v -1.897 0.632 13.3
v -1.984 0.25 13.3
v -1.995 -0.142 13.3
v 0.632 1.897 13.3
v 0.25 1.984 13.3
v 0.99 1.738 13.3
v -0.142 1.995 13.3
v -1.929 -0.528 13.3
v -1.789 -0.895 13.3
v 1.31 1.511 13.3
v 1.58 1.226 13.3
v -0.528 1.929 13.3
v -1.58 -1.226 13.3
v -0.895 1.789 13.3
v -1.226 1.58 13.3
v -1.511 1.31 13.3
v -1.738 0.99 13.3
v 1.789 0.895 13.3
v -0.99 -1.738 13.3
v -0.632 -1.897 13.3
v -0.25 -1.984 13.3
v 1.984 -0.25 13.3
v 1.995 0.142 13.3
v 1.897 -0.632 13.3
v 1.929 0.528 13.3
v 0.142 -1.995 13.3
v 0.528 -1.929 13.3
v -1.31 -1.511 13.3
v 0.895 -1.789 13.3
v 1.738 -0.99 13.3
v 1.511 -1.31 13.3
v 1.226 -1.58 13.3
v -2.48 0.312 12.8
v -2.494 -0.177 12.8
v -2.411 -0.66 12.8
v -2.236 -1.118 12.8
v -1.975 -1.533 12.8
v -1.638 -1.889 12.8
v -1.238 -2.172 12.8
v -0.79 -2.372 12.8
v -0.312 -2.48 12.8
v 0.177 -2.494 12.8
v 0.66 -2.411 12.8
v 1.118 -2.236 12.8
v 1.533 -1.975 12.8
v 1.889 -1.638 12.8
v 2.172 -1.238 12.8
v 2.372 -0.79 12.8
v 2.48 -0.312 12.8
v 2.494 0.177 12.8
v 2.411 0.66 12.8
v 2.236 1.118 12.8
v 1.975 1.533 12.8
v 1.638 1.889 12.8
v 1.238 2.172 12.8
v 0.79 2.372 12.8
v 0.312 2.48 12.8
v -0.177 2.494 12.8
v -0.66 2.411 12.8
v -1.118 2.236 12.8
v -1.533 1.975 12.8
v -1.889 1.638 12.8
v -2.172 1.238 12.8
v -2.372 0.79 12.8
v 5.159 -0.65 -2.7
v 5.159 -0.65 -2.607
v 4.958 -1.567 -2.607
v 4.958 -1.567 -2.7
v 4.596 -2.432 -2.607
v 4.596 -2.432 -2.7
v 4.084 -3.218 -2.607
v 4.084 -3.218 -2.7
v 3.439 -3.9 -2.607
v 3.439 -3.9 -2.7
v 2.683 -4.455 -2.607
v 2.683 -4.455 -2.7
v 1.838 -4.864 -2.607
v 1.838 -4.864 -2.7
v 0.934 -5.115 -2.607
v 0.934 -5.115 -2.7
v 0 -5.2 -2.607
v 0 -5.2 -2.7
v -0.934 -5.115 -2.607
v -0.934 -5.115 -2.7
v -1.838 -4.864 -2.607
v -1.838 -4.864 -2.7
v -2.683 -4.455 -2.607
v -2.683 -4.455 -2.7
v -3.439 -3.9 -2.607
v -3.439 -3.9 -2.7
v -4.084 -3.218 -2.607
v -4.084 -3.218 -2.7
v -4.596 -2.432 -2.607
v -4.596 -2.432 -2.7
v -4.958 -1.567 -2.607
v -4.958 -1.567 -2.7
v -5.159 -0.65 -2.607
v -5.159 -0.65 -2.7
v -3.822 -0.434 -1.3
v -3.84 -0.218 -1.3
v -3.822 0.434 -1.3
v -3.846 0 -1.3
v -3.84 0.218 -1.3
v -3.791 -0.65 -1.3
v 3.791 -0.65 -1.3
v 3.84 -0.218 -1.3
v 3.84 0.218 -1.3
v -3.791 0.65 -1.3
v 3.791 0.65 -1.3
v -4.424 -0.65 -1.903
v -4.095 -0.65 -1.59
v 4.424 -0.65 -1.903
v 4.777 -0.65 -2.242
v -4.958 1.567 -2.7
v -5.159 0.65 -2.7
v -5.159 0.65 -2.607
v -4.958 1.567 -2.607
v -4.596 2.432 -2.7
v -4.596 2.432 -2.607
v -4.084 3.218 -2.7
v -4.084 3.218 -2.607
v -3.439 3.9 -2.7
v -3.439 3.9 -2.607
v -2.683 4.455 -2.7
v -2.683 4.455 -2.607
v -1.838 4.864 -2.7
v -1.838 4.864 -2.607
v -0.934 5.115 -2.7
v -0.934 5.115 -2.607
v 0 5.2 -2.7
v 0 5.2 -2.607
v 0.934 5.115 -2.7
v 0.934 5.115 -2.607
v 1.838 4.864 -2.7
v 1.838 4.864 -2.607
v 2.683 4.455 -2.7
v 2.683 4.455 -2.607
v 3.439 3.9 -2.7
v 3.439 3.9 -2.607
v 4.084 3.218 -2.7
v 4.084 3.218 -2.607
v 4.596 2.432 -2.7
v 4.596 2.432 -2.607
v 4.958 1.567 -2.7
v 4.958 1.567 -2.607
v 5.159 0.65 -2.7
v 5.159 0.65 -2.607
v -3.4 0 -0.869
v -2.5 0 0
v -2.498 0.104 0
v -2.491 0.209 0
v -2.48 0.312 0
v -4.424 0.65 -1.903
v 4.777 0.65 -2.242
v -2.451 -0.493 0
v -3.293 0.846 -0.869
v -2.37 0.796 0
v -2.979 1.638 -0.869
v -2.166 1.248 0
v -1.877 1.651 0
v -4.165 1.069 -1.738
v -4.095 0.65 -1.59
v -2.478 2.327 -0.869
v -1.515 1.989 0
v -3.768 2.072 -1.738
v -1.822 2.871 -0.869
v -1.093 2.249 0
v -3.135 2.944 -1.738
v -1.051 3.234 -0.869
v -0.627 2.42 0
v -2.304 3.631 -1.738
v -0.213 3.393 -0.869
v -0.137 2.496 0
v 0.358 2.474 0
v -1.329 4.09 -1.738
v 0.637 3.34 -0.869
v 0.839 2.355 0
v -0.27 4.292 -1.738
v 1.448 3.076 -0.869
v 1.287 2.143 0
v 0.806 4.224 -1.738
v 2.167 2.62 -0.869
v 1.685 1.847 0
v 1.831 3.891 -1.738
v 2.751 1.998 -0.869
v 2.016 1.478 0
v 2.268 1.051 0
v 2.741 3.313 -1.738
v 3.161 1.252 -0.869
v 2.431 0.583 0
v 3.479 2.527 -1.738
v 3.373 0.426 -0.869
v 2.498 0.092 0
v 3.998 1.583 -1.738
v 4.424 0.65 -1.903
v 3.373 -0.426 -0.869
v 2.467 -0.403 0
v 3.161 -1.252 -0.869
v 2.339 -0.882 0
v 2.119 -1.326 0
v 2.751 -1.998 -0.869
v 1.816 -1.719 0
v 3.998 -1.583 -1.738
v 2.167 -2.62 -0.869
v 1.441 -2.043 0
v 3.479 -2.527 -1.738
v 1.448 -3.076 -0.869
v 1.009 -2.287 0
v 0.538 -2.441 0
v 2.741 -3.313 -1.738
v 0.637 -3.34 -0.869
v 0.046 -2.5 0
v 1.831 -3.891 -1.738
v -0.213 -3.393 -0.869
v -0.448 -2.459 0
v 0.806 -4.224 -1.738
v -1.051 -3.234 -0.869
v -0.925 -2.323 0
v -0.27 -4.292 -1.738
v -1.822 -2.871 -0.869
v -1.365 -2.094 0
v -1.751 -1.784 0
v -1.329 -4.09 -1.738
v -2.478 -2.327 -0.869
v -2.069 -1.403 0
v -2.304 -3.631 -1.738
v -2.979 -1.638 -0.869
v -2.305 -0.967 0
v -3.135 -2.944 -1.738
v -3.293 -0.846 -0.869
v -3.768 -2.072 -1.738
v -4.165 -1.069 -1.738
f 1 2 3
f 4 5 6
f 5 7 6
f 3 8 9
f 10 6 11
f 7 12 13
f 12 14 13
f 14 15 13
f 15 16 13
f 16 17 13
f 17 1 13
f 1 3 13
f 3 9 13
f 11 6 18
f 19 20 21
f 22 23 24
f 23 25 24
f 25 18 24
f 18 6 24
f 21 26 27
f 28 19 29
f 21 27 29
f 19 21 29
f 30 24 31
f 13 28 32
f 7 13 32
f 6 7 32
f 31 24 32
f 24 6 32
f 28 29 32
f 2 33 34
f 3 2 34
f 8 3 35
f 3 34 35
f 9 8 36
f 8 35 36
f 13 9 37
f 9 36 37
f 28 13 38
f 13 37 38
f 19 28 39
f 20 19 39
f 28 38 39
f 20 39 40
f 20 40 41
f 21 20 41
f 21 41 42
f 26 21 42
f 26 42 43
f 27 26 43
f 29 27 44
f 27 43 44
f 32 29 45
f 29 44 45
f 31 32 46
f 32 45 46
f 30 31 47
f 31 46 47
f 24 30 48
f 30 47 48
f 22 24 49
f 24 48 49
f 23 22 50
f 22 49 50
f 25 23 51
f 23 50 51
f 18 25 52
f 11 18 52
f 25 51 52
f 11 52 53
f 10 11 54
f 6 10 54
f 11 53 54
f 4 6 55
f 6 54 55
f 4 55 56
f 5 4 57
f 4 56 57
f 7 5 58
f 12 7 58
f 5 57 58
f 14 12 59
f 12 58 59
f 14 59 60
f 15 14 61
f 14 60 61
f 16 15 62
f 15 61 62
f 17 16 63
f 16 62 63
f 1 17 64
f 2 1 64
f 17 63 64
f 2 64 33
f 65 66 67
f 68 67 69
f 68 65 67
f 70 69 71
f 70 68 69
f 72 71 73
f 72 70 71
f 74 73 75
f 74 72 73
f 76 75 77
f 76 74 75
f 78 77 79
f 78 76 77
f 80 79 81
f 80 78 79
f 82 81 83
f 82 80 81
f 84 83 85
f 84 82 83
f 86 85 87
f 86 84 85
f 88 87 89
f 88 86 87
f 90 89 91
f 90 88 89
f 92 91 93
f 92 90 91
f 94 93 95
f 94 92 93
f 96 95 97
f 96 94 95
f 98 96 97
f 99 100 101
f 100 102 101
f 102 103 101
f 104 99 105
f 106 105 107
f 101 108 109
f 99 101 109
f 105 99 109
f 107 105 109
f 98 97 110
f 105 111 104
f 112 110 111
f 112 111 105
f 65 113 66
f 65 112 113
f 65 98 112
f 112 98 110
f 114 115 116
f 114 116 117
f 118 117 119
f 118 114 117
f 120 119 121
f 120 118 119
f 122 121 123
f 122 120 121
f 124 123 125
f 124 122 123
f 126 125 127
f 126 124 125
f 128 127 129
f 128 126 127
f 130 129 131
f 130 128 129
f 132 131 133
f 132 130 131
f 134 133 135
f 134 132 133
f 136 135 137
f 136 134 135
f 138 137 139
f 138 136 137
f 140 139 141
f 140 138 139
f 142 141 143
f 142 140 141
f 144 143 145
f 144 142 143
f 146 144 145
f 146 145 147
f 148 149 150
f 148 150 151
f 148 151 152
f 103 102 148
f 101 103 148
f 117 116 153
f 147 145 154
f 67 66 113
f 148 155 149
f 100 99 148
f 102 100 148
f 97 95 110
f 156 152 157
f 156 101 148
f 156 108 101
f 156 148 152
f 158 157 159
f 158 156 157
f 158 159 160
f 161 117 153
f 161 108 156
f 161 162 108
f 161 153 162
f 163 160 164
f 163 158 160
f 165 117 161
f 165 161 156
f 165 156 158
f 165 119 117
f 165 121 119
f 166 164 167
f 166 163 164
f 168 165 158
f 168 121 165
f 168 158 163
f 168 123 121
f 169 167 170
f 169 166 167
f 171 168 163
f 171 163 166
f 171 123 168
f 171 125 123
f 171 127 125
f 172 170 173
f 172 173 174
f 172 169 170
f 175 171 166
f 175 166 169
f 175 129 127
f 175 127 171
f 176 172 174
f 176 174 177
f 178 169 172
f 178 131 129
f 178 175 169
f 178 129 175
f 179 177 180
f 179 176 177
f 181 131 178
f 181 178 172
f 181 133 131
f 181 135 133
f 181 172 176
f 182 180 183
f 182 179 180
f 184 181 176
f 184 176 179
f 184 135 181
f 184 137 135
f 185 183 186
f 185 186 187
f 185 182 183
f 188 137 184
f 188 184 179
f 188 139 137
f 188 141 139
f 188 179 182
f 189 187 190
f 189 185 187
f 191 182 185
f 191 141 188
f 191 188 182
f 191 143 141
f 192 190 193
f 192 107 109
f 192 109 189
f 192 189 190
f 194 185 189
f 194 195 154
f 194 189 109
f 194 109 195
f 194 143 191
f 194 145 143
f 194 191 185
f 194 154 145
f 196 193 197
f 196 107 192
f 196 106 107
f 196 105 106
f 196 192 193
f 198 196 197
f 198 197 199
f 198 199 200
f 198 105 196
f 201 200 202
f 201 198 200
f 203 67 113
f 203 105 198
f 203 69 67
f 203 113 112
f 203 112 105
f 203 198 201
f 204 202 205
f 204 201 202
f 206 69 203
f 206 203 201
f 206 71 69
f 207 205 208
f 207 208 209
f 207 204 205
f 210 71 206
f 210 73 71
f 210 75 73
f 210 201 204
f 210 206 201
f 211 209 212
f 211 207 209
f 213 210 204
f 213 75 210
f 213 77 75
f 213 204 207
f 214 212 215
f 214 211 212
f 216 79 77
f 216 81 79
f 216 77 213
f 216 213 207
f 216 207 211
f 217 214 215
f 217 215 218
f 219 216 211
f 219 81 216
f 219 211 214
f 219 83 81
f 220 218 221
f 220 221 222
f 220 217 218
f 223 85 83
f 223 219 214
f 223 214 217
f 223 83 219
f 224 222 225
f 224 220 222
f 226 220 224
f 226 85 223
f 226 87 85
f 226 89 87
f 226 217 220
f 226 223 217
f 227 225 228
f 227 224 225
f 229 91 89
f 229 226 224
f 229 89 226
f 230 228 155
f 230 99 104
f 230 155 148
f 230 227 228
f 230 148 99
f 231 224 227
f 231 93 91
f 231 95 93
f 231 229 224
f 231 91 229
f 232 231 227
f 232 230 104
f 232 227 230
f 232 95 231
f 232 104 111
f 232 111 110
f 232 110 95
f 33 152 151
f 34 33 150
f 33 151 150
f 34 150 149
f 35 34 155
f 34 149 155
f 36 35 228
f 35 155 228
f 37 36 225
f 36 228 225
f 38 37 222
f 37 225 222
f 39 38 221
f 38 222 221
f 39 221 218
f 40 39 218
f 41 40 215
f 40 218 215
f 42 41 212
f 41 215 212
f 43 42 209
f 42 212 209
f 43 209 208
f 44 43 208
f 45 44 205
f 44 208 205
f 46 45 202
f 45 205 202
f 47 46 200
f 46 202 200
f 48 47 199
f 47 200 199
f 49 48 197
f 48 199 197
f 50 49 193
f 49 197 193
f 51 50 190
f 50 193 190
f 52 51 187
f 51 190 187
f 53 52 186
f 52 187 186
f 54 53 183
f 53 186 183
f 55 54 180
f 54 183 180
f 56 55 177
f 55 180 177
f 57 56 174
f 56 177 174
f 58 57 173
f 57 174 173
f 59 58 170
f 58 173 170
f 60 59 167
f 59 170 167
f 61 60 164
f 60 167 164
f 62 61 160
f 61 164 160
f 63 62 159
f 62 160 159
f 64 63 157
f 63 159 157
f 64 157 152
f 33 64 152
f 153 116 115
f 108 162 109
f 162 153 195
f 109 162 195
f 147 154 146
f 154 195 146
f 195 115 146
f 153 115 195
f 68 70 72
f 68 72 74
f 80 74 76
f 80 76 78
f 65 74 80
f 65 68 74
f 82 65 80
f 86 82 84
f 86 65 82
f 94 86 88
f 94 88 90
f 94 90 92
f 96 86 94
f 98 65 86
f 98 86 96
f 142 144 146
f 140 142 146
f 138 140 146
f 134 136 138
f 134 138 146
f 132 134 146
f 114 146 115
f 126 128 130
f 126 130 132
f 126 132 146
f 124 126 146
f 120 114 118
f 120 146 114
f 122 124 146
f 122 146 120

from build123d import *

# Parameters (mm, degrees)
ESQUISSE2_W     = 10.4
ESQUISSE2_H     = 1.3
FENTE1_DEPTH    = 1.4
ESQUISSE3_W     = 2.5
ESQUISSE3_H     = 13.3
CHANFREIN1_SIZE = 0.5


with BuildPart() as part:
    # Esquisse1 → Base-Révolution (revolve)
    with BuildSketch(Plane(origin=(0, 0, 0), x_dir=(1, 0, 0), z_dir=(0, 1, 0))):
        Polygon((2.5, 0), (5.2, 2.607359692), (5.2, 2.7), (0, 2.7), (0, 0), align=None)
    revolve(axis=Axis((0, 0, 0), (0, 0, -1)))

    # Esquisse2 → fente1 (cut)
    with BuildSketch(Plane.XY.offset(-2.7)):
        Rectangle(ESQUISSE2_W, ESQUISSE2_H)
    extrude(amount=FENTE1_DEPTH, mode=Mode.SUBTRACT)

    # Esquisse3 → Boss.-Révol.1 (revolve)
    with BuildSketch(Plane(origin=(0, 0, 0), x_dir=(1, 0, 0), z_dir=(0, 1, 0))):
        with Locations((1.25, -6.65)):
            Rectangle(ESQUISSE3_W, ESQUISSE3_H)
    revolve(axis=Axis((0, 0, 0), (0, 0, 1)))

    # Chanfrein1
    chanfrein1_edges = [part.edges().sort_by_distance(p)[0] for p in [
        (-2.5, 0, 13.3),
    ]]
    chamfer(chanfrein1_edges, length=CHANFREIN1_SIZE)


solid = part.part
